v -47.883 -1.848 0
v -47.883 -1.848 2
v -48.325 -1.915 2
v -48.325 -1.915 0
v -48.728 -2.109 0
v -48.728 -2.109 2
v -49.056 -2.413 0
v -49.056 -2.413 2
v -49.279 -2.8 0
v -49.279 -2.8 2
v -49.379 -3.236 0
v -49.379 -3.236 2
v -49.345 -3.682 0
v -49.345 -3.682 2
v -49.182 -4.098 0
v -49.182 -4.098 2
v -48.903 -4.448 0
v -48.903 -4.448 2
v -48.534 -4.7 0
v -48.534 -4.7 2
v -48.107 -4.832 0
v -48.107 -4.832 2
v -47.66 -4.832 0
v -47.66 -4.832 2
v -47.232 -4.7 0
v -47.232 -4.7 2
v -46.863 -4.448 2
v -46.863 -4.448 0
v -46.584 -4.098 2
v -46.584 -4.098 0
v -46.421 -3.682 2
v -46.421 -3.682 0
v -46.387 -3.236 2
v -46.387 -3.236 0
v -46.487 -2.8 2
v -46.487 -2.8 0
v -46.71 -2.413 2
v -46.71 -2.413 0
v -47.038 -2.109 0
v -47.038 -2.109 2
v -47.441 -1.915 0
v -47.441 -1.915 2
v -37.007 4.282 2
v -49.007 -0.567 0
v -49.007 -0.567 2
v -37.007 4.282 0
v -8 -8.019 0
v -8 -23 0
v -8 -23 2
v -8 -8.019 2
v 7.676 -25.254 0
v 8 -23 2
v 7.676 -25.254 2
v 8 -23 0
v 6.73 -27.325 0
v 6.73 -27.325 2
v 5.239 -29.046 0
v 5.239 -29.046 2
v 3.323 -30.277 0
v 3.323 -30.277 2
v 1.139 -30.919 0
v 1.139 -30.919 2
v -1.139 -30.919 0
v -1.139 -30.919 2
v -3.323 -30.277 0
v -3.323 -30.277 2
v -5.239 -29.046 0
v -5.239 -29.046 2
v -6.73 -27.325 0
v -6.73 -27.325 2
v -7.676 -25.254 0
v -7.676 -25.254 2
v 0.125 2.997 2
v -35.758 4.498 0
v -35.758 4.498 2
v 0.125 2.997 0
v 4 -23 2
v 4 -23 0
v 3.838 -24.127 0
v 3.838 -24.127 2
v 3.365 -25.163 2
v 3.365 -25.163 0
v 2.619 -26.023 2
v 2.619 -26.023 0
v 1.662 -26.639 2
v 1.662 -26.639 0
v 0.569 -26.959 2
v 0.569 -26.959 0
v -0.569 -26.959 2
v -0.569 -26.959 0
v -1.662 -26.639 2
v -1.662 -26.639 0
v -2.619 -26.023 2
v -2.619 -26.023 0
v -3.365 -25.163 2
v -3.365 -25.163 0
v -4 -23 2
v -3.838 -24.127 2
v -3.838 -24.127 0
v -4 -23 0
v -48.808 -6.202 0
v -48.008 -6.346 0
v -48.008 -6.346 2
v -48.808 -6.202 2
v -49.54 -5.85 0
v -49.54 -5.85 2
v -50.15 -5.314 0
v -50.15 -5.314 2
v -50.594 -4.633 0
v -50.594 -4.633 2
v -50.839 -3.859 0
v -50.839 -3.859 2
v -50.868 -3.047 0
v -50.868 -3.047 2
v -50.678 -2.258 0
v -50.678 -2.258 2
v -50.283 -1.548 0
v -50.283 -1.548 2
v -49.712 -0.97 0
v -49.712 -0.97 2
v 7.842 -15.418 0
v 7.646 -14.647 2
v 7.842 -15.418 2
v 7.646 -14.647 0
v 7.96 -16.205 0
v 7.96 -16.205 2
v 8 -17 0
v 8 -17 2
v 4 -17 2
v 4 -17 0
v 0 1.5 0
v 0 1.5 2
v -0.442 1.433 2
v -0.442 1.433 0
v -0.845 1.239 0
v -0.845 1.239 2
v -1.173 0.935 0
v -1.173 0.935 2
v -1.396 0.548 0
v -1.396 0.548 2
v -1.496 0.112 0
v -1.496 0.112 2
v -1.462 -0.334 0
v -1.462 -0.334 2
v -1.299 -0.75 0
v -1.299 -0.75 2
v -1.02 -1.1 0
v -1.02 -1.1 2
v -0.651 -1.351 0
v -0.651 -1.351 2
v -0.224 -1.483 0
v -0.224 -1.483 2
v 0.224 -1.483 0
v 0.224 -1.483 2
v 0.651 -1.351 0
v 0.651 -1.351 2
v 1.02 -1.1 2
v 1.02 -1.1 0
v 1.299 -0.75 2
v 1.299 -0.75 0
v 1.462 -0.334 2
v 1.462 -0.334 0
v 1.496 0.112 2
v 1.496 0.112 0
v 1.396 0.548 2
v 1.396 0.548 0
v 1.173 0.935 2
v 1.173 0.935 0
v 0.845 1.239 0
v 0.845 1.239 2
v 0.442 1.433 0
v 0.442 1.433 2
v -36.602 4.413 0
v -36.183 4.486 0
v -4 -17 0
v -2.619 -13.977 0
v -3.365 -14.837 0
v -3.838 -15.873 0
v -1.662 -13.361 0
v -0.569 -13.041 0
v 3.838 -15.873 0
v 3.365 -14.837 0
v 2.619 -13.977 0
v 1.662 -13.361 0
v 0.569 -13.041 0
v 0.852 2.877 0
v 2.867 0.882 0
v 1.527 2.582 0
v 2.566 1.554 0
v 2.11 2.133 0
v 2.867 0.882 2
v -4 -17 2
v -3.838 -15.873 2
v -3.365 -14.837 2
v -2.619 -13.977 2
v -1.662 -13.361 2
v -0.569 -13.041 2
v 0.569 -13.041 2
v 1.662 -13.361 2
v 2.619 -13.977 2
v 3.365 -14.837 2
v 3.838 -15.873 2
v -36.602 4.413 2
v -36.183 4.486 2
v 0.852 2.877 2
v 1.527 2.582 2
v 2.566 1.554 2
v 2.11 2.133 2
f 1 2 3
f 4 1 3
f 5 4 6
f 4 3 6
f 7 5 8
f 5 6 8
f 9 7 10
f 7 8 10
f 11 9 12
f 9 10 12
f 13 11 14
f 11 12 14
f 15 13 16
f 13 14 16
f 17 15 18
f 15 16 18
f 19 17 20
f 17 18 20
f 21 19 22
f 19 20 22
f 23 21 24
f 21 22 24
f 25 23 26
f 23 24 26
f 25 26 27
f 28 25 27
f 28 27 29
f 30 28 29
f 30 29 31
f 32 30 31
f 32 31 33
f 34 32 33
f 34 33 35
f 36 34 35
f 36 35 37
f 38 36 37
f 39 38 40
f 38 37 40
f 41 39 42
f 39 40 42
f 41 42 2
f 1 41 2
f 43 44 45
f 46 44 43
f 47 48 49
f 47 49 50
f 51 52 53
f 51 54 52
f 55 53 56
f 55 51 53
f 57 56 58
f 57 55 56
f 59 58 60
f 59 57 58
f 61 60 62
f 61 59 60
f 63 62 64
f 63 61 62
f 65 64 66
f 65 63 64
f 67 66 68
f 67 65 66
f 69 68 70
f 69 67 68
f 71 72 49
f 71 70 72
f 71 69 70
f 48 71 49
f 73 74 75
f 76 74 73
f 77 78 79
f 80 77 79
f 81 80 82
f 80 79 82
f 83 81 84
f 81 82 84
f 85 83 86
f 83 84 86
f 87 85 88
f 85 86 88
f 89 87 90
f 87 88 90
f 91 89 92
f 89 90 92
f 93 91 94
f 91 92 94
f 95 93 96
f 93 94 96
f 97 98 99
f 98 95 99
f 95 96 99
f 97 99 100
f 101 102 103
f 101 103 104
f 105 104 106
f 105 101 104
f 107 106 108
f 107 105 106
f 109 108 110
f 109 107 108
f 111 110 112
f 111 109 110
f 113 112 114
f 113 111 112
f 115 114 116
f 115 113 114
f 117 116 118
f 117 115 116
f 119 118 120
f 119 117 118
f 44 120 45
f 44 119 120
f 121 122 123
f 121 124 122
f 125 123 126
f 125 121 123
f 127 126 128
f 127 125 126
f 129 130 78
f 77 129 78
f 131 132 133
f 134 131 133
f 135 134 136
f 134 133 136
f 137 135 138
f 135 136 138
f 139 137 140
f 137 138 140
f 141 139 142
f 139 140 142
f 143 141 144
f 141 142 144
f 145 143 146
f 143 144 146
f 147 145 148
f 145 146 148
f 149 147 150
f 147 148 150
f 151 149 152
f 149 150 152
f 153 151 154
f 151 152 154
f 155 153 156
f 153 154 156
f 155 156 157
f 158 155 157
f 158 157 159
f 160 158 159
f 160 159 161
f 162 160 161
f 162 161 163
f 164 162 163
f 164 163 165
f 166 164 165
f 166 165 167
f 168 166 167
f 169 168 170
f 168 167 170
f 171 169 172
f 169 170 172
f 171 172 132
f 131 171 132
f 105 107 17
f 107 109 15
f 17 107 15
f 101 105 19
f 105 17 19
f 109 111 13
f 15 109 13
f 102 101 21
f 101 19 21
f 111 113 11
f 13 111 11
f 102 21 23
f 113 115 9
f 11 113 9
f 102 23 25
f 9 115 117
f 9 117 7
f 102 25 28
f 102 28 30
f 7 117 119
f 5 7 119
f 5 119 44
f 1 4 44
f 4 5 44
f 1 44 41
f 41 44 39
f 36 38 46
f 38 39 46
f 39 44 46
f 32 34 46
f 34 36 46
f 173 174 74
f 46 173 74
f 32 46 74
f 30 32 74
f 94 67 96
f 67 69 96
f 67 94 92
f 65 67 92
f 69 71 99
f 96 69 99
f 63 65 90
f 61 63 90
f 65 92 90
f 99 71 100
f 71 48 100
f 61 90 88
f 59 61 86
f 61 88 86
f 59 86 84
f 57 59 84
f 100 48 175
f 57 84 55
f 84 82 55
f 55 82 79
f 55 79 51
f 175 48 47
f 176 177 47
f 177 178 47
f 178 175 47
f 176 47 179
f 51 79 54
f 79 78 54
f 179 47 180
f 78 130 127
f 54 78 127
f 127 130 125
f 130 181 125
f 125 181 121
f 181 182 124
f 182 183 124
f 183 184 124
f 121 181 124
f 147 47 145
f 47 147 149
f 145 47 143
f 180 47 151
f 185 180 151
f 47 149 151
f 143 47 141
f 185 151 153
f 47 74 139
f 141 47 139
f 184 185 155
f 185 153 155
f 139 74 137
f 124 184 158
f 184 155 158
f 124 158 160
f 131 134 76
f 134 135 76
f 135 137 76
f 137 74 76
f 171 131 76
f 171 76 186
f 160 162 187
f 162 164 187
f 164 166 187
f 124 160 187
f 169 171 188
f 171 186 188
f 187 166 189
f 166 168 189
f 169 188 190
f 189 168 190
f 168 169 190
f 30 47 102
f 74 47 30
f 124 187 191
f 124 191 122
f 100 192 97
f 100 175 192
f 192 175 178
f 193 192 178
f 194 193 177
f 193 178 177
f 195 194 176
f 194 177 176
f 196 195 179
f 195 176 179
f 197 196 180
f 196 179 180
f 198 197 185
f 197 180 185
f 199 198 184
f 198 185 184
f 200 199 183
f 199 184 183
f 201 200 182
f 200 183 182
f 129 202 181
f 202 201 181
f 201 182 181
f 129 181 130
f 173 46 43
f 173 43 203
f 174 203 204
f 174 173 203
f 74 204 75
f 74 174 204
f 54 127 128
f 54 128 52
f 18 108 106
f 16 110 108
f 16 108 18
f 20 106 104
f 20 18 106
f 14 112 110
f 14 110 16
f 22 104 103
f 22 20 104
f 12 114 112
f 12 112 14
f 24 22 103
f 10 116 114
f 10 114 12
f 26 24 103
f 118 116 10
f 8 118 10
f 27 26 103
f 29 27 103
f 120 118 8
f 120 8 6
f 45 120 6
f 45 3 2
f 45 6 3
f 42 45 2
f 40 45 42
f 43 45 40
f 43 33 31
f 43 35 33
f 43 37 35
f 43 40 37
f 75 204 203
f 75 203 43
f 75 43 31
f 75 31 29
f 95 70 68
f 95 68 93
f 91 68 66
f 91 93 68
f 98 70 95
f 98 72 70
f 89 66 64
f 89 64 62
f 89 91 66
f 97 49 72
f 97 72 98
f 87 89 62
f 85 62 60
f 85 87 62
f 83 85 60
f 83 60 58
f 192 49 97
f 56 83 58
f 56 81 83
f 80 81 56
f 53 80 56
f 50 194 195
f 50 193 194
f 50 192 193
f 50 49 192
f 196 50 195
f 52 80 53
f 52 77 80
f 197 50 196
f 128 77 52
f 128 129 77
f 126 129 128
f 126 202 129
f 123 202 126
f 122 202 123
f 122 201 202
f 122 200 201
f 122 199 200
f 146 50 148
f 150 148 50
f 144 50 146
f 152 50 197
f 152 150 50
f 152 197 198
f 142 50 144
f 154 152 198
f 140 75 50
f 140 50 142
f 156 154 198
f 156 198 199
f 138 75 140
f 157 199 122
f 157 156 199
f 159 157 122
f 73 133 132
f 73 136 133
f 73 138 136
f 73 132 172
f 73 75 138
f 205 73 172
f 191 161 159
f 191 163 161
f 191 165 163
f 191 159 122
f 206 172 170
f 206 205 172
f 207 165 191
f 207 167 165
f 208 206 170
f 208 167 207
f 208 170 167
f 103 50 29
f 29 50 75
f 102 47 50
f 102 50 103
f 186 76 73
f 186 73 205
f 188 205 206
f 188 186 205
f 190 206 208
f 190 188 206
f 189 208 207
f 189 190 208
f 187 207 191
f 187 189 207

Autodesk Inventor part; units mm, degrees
ref_plane "YZ Plane" through (0, 0, 0) normal (1, 0, 0) x (0, 1, 0)
ref_plane "XZ Plane" through (0, 0, 0) normal (0, 1, 0) x (-1, 0, 0)
ref_plane "XY Plane" through (0, 0, 0) normal (0, 0, 1) x (1, 0, 0)
sketch "スケッチ1" plane through (0, 0, 0) normal (0, 0, 1) x (1, 0, 0)
  line L0 (0, 0) -> (0, -20) construction
  line L1 (0, -20) -> (-47.8831, -3.3483) construction
  line L2 (-47.8831, -3.3483) -> (0, 0) construction
  arc A0 (-49.007, -0.5668) -> (-48.0084, -6.3457) centre (-47.8831, -3.3483) ccw
  arc A1 (2.8673, 0.8824) -> (0.1253, 2.9974) centre (0, 0) ccw
  arc A2 (-8, -23) -> (8, -23) centre (0, -23) ccw
  arc A3 (4, -17) -> (-4, -17) centre (0, -17) ccw
  arc A4 (-4, -23) -> (4, -23) centre (0, -23) ccw
  line L3 (-4, -17) -> (-4, -23)
  line L4 (4, -17) -> (4, -23)
  line L5 (0, -23) -> (0, -17) construction
  line L6 (2.8673, 0.8824) -> (7.6462, -14.6471)
  line L7 (8, -17) -> (8, -23)
  arc A5 (8, -17) -> (7.6462, -14.6471) centre (0, -17) ccw
  line L8 (-49.007, -0.5668) -> (-37.007, 4.2821)
  line L9 (-35.7577, 4.498) -> (0.1253, 2.9974)
  arc A6 (-35.7577, 4.498) -> (-37.007, 4.2821) centre (-35.8831, 1.5006) ccw
  line L10 (-47.8831, -3.3483) -> (-35.8831, 1.5006) construction
  line L11 (-8, -23) -> (-8, -8.0188)
  line L12 (-8, -8.0188) -> (-48.0084, -6.3457)
  dimension "d0" = 20
  dimension "d2" = 48
  dimension "d3" = 3
  dimension "d13" = 6
  dimension "d14" = 4
  dimension "d15" = 8
  dimension "d17" = 3
  dimension "d18" = 4
  dimension "d20" = 12
  dimension "d21" = 86
extrude "押し出し1" add sketch "スケッチ1" along normal blind 2
hole "穴1" at (-47.8831, -3.3483, 0) at (0, 0, 0) direction (0, 0, 1) diameter 3 end through all
properties part number "COXA_YAW_SUPPORT-LINK_BACK"
